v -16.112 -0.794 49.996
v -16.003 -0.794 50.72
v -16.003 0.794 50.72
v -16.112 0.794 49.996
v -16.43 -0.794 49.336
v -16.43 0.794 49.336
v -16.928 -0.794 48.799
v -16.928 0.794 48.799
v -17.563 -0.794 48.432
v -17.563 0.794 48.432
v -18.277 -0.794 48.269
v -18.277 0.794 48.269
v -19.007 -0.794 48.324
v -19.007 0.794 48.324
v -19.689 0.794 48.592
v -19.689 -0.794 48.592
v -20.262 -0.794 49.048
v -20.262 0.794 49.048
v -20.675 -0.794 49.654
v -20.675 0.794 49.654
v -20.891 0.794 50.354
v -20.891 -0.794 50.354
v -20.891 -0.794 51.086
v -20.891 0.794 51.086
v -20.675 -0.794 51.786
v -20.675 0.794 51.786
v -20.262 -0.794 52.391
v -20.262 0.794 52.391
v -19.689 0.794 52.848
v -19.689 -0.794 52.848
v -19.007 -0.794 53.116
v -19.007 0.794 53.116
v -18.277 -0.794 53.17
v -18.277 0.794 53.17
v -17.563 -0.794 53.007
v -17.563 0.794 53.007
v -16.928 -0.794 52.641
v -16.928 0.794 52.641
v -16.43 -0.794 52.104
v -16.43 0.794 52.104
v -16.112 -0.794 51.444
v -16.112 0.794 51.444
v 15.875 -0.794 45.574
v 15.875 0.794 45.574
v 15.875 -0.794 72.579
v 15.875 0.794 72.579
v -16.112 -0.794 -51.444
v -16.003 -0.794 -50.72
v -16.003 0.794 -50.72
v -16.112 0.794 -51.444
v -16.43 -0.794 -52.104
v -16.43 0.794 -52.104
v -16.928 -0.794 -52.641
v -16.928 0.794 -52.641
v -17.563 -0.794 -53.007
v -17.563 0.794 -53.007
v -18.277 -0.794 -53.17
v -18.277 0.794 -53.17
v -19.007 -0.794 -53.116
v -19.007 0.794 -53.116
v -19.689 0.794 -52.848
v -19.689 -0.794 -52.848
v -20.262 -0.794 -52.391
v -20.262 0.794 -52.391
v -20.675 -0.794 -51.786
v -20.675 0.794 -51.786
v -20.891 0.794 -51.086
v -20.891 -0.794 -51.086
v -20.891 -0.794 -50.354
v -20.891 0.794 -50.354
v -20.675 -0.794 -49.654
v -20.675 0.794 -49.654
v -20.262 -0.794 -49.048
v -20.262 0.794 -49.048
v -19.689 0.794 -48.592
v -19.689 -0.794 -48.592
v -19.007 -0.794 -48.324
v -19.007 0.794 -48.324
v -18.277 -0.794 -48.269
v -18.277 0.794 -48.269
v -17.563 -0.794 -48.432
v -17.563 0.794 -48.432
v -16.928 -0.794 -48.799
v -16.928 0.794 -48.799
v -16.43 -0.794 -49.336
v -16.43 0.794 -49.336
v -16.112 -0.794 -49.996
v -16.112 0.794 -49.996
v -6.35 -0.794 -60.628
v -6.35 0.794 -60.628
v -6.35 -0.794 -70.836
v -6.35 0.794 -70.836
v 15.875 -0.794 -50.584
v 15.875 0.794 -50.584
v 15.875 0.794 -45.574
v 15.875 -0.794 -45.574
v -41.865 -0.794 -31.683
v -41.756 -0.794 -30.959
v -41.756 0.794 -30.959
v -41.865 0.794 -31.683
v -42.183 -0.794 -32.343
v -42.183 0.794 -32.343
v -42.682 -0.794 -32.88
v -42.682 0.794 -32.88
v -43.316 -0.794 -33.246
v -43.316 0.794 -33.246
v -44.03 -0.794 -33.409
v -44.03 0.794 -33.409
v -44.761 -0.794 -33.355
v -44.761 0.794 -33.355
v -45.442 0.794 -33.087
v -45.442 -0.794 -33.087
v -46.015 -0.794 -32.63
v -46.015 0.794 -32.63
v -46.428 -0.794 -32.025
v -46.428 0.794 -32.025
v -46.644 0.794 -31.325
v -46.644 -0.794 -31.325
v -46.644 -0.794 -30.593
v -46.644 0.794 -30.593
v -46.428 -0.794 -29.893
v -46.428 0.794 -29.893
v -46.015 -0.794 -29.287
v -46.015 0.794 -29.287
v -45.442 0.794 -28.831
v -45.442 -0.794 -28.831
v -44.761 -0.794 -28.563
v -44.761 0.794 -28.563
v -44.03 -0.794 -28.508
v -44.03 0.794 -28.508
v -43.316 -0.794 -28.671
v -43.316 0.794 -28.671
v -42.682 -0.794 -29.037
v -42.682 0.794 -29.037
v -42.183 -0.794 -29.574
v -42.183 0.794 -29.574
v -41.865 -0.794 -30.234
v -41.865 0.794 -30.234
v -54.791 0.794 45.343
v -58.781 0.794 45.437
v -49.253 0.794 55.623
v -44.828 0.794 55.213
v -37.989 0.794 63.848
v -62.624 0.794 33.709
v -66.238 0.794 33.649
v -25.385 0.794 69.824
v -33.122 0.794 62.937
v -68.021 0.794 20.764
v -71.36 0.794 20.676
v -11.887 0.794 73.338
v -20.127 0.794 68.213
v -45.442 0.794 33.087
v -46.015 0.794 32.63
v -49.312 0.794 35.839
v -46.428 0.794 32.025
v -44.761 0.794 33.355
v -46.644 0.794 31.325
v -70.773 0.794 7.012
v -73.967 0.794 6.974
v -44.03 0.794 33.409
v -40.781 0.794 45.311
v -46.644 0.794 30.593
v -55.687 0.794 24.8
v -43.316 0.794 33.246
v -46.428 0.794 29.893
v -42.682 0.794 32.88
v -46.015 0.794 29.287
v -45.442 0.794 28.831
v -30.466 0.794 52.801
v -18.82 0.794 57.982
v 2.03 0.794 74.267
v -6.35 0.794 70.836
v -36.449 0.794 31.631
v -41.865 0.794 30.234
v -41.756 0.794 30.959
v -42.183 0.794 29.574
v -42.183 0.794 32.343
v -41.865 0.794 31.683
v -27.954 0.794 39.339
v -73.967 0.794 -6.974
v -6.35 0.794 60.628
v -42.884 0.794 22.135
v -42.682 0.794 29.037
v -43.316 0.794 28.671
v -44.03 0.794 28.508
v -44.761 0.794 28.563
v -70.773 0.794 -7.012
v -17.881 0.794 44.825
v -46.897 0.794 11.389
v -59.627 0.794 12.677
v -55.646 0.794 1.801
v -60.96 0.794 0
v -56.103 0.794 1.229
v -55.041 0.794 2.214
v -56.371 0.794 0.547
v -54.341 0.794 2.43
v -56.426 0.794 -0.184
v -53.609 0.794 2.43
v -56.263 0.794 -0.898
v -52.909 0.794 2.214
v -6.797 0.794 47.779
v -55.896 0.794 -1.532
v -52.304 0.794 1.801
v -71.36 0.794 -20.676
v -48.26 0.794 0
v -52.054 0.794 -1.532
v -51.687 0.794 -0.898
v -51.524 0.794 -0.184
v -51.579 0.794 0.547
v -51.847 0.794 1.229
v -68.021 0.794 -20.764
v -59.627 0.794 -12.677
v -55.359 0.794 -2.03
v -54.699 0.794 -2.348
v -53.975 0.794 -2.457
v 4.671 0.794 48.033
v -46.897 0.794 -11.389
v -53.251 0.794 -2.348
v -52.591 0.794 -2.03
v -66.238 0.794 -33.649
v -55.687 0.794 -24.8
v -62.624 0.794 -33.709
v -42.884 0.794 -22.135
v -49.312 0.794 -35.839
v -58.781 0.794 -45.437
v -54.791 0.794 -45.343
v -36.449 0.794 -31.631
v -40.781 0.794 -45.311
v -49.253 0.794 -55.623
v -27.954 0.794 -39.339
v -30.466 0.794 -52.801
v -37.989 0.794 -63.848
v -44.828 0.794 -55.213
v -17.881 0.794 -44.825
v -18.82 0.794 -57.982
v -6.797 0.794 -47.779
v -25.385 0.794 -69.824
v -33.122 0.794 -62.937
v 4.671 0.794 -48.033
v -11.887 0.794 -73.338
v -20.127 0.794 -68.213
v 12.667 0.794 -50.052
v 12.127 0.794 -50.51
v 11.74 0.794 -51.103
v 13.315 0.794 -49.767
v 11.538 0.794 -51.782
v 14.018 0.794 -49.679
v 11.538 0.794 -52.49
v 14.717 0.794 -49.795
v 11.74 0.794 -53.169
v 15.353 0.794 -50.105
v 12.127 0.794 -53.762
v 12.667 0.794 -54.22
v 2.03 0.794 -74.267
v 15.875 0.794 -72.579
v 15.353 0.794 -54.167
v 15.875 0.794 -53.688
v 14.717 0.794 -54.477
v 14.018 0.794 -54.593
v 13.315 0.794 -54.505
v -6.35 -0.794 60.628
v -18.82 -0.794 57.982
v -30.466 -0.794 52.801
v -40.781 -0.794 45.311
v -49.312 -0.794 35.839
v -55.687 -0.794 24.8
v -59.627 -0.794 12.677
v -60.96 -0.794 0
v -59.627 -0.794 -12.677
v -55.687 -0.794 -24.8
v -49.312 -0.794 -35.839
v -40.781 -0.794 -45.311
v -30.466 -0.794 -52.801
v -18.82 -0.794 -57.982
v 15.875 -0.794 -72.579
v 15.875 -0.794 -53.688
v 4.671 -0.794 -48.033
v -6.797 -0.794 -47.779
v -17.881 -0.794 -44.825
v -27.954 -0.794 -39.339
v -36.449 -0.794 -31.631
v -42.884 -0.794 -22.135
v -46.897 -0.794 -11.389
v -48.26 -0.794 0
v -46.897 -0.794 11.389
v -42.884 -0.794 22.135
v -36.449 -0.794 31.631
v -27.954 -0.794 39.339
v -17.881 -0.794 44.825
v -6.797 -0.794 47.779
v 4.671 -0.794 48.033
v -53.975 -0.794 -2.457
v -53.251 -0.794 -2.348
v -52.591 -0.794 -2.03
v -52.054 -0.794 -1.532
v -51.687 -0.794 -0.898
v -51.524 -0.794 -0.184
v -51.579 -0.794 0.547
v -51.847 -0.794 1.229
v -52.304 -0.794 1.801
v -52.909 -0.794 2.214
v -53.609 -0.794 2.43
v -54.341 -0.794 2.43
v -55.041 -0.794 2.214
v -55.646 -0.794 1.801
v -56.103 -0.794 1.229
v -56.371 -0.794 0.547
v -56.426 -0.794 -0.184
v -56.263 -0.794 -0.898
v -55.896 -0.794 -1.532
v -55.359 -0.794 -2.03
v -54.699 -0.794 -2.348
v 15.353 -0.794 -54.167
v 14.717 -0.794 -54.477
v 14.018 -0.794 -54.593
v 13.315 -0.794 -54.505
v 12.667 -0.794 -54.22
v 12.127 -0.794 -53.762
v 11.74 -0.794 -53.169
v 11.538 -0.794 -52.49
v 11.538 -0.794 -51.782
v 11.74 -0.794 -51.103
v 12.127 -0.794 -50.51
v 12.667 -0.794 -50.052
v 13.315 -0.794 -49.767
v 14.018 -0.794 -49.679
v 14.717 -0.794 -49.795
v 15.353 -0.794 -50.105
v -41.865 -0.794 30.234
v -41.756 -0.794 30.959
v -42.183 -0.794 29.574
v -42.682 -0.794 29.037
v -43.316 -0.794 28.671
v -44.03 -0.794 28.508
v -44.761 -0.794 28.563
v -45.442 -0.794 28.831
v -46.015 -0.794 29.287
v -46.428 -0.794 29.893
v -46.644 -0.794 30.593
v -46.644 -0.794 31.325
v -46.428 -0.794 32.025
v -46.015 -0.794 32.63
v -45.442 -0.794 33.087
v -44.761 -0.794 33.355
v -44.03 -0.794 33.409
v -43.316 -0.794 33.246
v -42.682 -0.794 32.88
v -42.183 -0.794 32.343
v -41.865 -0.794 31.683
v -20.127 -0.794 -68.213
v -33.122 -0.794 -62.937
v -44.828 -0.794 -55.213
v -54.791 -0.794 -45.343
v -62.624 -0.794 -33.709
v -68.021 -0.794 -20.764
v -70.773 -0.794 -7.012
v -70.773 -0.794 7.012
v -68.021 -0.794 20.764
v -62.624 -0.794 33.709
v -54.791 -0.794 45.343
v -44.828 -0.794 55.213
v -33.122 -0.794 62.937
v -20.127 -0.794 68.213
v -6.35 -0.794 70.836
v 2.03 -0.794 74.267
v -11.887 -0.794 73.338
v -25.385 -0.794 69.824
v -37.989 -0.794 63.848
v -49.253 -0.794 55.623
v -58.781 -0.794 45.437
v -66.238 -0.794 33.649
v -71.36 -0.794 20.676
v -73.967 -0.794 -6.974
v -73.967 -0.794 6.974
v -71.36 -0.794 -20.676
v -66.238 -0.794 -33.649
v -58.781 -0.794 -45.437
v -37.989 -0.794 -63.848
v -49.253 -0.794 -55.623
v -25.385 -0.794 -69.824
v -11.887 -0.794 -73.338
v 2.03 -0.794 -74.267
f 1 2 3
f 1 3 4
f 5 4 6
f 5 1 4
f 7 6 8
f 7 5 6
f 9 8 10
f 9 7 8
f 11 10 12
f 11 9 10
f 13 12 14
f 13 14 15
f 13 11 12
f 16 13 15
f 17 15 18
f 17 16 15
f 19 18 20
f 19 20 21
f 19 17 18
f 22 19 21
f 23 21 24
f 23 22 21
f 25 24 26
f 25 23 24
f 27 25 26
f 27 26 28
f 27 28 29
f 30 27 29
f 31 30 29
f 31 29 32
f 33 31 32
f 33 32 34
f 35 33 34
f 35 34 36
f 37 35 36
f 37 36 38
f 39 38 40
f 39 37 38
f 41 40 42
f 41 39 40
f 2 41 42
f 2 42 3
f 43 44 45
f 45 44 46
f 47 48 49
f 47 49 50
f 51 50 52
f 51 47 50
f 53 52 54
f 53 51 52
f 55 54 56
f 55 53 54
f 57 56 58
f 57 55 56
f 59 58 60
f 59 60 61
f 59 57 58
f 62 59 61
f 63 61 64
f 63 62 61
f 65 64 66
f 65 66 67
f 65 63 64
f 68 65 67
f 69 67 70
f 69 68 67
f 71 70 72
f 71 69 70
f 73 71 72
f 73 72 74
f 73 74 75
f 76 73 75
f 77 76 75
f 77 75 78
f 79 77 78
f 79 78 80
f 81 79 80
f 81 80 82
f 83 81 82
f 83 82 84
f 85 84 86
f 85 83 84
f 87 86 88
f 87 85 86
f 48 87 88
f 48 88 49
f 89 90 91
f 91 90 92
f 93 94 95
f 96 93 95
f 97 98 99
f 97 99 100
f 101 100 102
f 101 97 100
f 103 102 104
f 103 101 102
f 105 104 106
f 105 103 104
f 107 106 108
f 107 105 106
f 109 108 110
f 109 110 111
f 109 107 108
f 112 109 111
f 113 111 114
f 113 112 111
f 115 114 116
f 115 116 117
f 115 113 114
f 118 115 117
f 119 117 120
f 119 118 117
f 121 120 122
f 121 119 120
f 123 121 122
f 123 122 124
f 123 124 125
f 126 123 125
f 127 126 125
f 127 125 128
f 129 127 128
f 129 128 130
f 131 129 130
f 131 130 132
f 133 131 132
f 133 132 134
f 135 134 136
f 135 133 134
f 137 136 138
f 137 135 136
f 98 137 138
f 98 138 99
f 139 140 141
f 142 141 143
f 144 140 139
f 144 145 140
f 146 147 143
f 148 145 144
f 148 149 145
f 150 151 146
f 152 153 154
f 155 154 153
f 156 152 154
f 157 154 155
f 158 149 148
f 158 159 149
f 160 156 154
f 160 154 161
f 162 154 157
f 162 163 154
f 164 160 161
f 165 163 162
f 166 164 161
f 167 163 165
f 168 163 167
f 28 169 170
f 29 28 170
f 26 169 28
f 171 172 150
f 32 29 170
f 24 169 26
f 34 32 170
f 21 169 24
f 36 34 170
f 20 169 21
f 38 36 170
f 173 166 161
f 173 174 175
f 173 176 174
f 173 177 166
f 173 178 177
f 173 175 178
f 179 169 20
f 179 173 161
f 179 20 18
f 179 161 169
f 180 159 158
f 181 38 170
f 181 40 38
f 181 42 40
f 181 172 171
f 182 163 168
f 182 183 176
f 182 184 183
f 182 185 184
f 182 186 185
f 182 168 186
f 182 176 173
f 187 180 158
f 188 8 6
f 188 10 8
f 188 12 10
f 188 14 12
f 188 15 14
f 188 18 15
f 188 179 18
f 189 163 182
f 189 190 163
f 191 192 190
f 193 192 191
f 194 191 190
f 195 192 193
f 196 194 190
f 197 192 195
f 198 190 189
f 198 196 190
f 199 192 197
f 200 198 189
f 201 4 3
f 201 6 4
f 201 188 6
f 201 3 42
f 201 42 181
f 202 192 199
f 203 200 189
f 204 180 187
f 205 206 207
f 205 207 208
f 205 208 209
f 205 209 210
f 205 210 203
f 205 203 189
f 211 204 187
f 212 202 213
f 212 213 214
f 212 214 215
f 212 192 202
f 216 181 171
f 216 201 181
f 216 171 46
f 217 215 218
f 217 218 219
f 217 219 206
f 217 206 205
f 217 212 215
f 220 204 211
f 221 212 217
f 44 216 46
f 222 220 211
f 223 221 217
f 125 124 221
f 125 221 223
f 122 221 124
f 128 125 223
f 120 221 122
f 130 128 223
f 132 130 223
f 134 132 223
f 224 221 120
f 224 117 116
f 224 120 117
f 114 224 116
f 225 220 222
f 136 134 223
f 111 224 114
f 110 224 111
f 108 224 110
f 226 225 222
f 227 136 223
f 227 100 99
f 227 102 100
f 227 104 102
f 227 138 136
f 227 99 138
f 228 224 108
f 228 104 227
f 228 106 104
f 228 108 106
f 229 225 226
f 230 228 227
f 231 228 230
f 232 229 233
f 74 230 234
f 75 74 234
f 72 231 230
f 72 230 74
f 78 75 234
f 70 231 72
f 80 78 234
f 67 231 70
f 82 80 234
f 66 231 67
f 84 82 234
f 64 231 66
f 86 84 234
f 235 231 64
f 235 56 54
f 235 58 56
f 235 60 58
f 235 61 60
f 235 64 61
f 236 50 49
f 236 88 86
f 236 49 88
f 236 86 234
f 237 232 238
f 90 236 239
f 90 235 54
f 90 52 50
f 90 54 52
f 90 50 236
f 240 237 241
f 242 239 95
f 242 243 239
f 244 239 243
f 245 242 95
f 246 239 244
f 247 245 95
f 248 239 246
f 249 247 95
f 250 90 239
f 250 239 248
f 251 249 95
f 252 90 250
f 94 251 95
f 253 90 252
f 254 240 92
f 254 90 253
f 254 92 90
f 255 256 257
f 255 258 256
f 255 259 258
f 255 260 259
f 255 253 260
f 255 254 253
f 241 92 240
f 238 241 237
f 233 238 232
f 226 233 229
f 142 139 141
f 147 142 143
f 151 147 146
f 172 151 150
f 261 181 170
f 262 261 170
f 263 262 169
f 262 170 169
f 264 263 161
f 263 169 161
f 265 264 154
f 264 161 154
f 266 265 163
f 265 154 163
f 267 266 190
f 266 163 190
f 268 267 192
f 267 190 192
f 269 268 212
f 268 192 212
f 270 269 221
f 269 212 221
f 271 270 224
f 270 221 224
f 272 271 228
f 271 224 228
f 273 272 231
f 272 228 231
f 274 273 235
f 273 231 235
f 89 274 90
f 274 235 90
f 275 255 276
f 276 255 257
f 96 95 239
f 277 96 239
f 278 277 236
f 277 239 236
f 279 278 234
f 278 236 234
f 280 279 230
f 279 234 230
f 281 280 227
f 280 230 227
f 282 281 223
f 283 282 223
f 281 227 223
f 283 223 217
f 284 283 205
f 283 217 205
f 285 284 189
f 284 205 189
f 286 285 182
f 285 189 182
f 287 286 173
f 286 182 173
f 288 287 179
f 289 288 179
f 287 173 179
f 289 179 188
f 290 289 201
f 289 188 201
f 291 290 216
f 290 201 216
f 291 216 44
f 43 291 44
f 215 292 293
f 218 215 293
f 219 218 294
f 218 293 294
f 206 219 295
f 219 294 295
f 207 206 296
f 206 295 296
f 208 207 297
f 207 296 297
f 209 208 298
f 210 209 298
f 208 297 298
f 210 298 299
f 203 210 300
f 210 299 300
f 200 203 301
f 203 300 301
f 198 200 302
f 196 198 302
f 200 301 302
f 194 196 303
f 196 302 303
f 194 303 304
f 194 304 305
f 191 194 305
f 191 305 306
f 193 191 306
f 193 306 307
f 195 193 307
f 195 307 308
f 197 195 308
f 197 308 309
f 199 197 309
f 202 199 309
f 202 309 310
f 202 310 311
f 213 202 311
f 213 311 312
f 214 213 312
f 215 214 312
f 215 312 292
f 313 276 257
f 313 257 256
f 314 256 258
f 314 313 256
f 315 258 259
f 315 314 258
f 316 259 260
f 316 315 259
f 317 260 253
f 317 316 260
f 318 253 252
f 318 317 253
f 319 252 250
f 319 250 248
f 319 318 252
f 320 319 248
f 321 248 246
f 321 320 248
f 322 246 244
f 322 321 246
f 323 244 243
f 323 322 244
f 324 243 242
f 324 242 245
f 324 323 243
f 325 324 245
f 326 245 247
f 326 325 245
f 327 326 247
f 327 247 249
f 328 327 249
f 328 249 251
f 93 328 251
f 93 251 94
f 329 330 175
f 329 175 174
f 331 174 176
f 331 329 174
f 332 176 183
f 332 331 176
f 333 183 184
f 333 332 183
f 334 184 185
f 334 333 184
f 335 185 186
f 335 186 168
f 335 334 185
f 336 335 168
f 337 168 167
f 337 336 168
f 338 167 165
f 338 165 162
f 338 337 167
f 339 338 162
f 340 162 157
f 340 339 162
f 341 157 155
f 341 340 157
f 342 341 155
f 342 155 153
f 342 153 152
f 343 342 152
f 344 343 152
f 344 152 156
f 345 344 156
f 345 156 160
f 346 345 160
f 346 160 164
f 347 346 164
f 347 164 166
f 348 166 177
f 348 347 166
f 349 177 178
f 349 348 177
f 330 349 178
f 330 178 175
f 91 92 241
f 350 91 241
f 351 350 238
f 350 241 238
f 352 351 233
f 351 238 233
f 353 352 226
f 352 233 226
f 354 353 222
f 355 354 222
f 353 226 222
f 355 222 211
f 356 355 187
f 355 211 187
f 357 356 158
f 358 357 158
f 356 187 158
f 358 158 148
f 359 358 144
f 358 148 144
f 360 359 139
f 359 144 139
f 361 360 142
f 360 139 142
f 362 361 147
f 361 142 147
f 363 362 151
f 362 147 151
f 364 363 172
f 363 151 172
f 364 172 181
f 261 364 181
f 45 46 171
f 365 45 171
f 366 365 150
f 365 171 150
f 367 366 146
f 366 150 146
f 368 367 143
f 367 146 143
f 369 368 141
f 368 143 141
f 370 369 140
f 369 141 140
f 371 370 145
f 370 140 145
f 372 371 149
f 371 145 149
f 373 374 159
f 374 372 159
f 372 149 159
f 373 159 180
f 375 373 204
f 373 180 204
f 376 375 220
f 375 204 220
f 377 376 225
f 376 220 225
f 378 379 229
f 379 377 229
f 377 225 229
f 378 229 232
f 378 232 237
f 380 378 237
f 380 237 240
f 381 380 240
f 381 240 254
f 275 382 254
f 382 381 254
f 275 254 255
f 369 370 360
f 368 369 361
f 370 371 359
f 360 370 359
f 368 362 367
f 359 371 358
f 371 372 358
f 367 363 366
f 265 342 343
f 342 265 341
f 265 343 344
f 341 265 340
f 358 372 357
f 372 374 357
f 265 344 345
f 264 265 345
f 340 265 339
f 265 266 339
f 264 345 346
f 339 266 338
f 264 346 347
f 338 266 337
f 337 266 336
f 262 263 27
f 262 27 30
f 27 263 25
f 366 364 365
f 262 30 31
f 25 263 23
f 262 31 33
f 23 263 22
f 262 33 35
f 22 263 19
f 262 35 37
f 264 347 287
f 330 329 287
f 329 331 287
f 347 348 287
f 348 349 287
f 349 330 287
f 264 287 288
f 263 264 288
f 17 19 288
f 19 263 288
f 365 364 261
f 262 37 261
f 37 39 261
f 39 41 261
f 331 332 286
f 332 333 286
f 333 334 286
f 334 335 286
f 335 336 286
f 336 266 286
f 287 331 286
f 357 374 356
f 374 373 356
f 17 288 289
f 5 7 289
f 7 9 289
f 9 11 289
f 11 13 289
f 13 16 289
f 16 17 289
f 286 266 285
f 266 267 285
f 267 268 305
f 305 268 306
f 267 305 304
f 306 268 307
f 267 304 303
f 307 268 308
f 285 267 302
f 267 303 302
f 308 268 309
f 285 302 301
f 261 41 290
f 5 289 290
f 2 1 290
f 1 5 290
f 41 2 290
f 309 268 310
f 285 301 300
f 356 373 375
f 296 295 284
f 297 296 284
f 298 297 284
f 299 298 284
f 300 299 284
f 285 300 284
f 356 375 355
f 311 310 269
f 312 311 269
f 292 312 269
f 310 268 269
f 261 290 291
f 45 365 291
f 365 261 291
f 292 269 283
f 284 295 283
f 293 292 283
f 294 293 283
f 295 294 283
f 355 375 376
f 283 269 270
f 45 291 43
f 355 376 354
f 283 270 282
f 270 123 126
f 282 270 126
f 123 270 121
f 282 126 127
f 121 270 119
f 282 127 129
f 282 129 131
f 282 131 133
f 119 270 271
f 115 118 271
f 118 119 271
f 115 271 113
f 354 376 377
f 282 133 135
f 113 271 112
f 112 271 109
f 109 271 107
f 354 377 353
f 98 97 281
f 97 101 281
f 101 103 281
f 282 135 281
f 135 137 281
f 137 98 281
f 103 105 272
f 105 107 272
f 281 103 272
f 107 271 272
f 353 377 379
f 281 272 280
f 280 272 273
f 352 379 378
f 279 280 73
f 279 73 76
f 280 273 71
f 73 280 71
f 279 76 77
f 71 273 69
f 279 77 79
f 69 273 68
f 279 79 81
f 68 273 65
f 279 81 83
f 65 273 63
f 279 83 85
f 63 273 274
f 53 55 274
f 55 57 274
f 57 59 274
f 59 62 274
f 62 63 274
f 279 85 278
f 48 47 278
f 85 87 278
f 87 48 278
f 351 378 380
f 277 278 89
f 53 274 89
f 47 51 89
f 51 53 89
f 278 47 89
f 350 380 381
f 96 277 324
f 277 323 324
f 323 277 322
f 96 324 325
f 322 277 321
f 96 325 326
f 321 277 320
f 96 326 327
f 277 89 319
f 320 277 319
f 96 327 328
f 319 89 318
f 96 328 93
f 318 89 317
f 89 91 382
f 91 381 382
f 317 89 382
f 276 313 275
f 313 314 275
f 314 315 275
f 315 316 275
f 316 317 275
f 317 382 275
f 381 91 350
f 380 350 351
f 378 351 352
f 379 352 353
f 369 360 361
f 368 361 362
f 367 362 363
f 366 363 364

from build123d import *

# Parameters (mm, degrees)
BOSS_EXTRUDE1_DEPTH          = 152.4
BOSS_EXTRUDE1_DEPTH_BACK     = 152.4
SKETCH3_W                    = 304.8
SKETCH3_H                    = 1.5875
SKETCH4_W                    = 304.8
SKETCH4_H                    = 304.8
CUT_EXTRUDE1_DEPTH           = 2.54
F_10_0_1935_DIAMETER_HOLE1_D = 4.9149
CIRPATTERN1_START            = -0.79375
CIRPATTERN1_OUTLINE_R        = 2.45745
CIRPATTERN1_DEPTH            = 1.5875


# Read off the part's stored shape, not the designer's step: CirPattern1
with BuildPart() as part:
    # Sketch3 → Boss-Extrude1 (new, two sides: drawn at the far end of the back side and taken through both)
    with BuildSketch(Plane.XY.offset(-BOSS_EXTRUDE1_DEPTH_BACK)):
        Rectangle(SKETCH3_W, SKETCH3_H)
    extrude(amount=BOSS_EXTRUDE1_DEPTH + BOSS_EXTRUDE1_DEPTH_BACK)

    # Sketch4 → Cut-Extrude1 (cut)
    # profile 1 of 2: a face of its own
    with BuildSketch(Plane(origin=(0, 0.79375, 0), x_dir=(1, 0, 0), z_dir=(0, 1, 0))):
        Rectangle(SKETCH4_W, SKETCH4_H)
        with BuildLine():
            Line((15.875, -45.57424684), (15.875, -72.579138876))
            ThreePointArc((15.875, -72.579138876), (-74.295, 0), (15.875, 72.579138876))
            Line((15.875, 72.579138876), (15.875, 45.57424684))
            ThreePointArc((15.875, 45.57424684), (-48.26, 0), (15.875, -45.57424684))
        make_face(mode=Mode.SUBTRACT)
    # profile 2 of 2: a face of its own
    with BuildSketch(Plane(origin=(0, 0.79375, 0), x_dir=(1, 0, 0), z_dir=(0, 1, 0))):
        with BuildLine():
            Line((-6.35, 60.628368772), (-6.35, 70.835950618))
            ThreePointArc((-6.35, 70.835950618), (-71.12, 0), (-6.35, -70.835950618))
            Line((-6.35, -70.835950618), (-6.35, -60.628368772))
            ThreePointArc((-6.35, -60.628368772), (-60.96, 0), (-6.35, 60.628368772))
        make_face()
    extrude(amount=-CUT_EXTRUDE1_DEPTH, mode=Mode.SUBTRACT)

    # #10 (0.1935) Diameter Hole1 (through all)
    with Locations(Plane(origin=(-53.975, 0.79375, 0), x_dir=(0, 0, 1), z_dir=(0, 1, 0))):
        with Locations((0, 0)):
            Hole(F_10_0_1935_DIAMETER_HOLE1_D / 2)

    # CirPattern1 outline → CirPattern1 (cut)
    with BuildSketch(Plane(origin=(0, 0, 0), x_dir=(1, 0, 0), z_dir=(0, 1, 0)).offset(CIRPATTERN1_START)):
        with Locations((-44.21373159, 30.958788152)):
            Circle(CIRPATTERN1_OUTLINE_R)
        with Locations((-18.460537236, 50.719909207)):
            Circle(CIRPATTERN1_OUTLINE_R)
        with BuildLine():
            Line((15.875, 50.583714627), (15.875, 53.687978321))
            ThreePointArc((15.875, 53.687978321), (11.512307959, 52.135846474), (15.875, 50.583714627))
        make_face()
        with Locations((-44.21373159, -30.958788152)):
            Circle(CIRPATTERN1_OUTLINE_R)
        with Locations((-18.460537236, -50.719909207)):
            Circle(CIRPATTERN1_OUTLINE_R)
    extrude(amount=CIRPATTERN1_DEPTH, mode=Mode.SUBTRACT)


solid = part.part
